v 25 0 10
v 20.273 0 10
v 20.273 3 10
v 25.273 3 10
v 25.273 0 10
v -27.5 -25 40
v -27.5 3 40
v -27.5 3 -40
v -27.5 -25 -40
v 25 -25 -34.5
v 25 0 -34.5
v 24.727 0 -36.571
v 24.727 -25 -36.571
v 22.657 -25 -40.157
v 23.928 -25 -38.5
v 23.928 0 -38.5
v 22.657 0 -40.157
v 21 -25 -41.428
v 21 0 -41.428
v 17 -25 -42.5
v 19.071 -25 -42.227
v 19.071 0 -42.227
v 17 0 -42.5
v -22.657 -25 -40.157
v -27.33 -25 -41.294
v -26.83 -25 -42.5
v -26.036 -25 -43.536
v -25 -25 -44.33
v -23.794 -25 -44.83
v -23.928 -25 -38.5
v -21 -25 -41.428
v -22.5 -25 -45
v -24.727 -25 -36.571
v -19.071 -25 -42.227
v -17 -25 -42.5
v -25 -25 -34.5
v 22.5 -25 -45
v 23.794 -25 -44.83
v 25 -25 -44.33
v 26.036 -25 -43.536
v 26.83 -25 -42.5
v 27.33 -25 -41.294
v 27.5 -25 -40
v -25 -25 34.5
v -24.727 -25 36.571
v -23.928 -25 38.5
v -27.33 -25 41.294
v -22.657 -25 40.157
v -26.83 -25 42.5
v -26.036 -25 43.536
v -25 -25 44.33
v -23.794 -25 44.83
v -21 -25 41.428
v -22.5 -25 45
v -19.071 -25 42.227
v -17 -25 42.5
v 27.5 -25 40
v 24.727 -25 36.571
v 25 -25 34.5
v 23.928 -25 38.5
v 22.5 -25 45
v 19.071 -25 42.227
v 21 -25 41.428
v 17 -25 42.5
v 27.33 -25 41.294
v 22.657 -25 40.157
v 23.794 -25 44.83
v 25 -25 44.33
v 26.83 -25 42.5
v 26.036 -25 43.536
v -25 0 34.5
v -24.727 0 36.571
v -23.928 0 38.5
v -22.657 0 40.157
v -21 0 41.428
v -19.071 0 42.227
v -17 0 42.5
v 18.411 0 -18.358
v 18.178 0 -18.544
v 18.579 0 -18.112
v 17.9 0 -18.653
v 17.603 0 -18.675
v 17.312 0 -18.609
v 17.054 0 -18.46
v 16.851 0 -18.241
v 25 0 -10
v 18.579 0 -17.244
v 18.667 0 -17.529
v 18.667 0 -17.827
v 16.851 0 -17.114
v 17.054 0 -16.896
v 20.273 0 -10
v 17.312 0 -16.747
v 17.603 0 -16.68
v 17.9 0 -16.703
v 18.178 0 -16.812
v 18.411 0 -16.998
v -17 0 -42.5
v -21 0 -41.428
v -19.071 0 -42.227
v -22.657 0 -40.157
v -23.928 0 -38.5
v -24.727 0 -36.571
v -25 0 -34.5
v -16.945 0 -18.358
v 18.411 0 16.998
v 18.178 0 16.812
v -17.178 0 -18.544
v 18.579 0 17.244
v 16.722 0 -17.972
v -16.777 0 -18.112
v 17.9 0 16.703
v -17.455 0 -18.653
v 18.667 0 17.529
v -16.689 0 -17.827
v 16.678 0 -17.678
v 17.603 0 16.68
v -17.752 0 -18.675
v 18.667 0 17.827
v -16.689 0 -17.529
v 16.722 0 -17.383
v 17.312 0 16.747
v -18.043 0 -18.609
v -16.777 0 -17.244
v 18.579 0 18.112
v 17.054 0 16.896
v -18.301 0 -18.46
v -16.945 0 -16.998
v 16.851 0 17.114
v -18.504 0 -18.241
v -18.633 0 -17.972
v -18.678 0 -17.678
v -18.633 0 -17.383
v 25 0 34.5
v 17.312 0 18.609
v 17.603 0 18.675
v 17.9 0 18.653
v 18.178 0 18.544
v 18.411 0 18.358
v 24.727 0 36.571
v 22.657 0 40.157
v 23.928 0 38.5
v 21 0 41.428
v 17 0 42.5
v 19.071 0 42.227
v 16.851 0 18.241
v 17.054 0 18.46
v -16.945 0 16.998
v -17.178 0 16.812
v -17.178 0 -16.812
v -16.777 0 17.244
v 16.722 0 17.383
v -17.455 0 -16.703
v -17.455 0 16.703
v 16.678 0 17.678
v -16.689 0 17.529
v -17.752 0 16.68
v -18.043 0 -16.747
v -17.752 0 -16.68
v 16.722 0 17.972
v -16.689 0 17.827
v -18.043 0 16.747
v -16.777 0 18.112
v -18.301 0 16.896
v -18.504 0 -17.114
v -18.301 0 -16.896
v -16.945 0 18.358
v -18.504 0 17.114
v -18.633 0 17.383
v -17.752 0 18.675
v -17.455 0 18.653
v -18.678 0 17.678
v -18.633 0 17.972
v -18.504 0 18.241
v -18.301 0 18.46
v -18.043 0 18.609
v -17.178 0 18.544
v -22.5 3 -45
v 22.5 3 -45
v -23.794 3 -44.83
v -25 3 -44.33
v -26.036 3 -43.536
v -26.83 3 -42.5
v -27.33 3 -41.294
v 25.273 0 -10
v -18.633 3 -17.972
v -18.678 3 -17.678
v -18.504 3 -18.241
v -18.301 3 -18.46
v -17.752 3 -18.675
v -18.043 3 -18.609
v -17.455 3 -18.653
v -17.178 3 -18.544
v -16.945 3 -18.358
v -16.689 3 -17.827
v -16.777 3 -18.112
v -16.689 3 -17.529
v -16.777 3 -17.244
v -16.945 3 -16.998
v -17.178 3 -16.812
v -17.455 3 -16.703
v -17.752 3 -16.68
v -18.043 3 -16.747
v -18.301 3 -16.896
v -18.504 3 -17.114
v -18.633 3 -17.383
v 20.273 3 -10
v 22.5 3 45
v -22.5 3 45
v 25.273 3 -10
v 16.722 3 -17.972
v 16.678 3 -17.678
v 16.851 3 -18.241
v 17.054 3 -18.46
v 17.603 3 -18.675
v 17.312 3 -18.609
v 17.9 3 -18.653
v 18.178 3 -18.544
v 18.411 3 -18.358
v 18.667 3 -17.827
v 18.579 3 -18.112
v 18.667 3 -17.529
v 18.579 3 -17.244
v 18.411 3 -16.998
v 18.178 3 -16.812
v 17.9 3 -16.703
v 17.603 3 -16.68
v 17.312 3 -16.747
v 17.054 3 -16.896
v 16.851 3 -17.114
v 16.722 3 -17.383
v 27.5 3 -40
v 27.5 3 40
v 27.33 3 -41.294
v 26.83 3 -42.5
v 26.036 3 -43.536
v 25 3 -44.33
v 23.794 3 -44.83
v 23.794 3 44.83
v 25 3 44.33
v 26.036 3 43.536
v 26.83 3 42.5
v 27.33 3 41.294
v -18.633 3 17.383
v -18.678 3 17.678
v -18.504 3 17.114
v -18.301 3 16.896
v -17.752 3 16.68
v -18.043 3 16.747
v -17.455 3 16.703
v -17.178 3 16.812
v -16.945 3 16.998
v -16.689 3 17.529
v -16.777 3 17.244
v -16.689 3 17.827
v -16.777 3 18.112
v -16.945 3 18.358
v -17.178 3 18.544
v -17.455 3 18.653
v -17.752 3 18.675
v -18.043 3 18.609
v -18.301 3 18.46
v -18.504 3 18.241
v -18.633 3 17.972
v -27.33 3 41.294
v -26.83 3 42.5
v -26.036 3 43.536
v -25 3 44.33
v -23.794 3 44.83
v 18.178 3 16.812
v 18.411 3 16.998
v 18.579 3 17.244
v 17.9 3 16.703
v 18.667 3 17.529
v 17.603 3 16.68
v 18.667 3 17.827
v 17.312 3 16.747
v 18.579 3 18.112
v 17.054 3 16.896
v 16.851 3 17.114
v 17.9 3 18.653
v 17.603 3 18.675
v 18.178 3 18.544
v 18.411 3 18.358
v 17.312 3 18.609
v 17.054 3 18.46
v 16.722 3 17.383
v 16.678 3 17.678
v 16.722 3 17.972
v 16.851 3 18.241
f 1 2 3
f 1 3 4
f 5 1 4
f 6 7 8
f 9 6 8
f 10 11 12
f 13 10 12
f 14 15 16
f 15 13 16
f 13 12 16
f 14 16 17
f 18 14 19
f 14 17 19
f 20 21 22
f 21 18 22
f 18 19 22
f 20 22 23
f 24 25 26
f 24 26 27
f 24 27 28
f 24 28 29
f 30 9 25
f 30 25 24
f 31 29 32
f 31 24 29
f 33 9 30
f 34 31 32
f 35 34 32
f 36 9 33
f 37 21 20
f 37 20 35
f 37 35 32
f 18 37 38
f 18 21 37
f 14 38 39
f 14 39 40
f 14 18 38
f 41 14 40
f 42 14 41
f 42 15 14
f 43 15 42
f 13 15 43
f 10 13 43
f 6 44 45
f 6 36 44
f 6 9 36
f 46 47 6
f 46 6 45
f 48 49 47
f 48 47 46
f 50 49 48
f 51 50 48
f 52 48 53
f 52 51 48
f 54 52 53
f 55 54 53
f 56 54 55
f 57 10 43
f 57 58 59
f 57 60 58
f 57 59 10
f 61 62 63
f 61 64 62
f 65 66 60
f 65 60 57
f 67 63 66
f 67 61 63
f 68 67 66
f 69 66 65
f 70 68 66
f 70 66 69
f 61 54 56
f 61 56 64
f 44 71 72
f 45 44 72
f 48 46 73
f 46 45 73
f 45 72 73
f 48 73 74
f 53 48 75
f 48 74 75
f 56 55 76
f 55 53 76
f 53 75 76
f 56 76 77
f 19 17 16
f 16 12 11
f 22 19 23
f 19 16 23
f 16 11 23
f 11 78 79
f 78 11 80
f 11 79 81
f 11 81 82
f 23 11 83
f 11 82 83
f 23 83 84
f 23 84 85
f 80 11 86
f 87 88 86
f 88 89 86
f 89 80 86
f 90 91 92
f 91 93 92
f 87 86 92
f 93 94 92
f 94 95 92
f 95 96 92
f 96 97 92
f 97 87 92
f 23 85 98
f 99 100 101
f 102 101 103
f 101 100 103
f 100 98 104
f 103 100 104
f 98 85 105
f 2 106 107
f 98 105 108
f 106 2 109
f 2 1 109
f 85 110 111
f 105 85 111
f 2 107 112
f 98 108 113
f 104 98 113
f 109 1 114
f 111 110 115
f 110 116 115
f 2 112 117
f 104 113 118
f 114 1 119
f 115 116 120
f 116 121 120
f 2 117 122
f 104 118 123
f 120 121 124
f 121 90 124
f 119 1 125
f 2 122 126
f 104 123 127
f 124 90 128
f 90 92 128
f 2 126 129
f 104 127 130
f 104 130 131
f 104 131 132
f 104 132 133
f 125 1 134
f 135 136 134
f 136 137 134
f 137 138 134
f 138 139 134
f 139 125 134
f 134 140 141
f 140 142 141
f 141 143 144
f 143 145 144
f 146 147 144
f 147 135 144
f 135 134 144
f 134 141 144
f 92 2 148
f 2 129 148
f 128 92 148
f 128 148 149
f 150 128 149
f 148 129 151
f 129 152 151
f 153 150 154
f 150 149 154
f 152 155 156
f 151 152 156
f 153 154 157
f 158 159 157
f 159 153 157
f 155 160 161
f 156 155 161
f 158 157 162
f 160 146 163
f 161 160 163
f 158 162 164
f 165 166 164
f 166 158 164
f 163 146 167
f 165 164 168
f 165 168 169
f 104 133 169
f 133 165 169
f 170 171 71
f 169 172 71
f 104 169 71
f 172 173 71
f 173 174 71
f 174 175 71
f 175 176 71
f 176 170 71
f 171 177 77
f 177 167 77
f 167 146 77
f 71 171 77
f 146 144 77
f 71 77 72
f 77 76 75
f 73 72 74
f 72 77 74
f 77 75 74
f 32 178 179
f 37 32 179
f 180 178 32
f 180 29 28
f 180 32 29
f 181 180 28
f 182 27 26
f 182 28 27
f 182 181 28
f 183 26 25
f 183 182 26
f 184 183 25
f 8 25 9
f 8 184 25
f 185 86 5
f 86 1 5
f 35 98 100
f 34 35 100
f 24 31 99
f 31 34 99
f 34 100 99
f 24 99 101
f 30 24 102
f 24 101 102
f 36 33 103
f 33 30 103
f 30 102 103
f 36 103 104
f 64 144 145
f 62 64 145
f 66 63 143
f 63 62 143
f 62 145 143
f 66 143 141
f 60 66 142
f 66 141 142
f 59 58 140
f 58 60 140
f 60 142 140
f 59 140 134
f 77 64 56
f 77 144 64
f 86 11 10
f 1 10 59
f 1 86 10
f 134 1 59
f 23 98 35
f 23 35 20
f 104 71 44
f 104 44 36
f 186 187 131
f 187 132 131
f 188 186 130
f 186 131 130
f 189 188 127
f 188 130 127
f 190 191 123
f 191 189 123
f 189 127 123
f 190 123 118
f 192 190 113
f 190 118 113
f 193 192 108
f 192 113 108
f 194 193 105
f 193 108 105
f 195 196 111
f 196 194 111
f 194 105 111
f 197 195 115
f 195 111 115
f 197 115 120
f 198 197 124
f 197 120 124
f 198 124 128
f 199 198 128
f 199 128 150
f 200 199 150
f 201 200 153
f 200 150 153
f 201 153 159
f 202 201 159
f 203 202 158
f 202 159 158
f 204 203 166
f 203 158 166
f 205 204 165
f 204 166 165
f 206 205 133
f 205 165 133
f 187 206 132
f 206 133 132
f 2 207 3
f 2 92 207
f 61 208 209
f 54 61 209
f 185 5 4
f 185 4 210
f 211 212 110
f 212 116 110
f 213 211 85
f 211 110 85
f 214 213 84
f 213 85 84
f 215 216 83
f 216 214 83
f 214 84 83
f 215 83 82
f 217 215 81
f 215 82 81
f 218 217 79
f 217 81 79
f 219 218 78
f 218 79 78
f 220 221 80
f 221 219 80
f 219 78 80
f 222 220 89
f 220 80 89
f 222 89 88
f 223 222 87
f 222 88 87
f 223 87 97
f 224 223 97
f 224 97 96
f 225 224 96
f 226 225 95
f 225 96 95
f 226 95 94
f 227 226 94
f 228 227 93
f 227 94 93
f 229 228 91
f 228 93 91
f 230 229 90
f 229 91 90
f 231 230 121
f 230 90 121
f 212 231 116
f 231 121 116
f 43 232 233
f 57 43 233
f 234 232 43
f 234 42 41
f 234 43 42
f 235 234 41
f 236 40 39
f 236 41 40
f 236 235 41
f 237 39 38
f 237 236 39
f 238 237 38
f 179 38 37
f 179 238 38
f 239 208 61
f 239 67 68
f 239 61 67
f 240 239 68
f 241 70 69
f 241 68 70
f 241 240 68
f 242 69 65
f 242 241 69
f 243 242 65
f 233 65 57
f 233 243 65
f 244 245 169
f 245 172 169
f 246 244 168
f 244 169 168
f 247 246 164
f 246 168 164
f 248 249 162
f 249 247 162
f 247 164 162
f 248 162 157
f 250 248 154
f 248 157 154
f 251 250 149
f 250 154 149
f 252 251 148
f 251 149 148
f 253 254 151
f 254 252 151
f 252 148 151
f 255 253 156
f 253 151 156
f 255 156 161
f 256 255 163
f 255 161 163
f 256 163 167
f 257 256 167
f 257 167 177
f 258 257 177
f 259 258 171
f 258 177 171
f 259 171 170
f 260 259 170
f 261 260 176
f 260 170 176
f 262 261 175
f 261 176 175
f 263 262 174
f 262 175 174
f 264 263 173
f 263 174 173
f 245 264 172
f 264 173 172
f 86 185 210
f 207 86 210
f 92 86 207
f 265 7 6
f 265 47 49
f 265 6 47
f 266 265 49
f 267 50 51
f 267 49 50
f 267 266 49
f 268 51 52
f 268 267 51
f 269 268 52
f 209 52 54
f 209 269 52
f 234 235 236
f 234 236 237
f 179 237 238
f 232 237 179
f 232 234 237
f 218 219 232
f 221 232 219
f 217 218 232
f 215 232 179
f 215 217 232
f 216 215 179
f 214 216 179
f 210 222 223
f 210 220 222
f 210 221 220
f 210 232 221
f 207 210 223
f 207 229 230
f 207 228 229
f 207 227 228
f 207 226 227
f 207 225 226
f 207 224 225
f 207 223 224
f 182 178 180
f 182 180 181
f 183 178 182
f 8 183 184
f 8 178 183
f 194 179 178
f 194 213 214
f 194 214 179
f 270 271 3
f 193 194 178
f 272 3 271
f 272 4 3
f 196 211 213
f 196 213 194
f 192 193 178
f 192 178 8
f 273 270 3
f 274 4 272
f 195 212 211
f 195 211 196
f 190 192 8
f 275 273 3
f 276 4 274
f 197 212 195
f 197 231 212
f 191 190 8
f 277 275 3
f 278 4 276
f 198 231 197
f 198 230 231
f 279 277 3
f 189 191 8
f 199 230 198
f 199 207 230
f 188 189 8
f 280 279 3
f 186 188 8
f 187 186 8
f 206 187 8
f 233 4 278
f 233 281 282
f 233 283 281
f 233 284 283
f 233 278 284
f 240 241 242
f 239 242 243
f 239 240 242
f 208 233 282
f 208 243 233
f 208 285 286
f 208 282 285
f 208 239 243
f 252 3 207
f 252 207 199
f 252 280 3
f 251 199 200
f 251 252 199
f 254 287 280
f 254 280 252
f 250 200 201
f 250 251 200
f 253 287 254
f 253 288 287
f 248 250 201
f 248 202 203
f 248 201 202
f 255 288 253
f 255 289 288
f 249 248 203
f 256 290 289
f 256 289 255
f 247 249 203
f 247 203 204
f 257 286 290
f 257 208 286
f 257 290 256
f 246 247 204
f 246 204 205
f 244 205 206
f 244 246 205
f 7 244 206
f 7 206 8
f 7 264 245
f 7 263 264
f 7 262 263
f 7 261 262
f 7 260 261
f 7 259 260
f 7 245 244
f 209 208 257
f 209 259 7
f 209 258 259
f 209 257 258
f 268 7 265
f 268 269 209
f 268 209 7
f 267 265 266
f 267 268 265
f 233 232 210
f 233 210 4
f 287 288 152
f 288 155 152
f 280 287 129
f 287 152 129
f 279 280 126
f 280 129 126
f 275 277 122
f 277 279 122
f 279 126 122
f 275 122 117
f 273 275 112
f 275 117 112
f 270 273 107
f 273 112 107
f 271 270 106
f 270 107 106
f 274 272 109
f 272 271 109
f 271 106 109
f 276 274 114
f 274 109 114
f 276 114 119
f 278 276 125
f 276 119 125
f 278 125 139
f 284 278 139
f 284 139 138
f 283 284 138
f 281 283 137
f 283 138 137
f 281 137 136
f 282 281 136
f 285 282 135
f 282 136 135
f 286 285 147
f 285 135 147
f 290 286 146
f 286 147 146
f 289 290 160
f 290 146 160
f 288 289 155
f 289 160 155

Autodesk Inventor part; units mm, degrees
ref_plane "YZ Plane" through (0, 0, 0) normal (1, 0, 0) x (0, 1, 0)
ref_plane "XZ Plane" through (0, 0, 0) normal (0, 1, 0) x (-1, 0, 0)
ref_plane "XY Plane" through (0, 0, 0) normal (0, 0, 1) x (1, 0, 0)
sketch "Sketch1" plane through (0, 0, 0) normal (0, 1, 0) x (-1, 0, 0)
  line L0 (22.5, 45) -> (-22.5, 45)
  line L1 (-27.5, 40) -> (-27.5, -40)
  line L2 (-22.5, -45) -> (22.5, -45)
  line L3 (27.5, -40) -> (27.5, 40)
  line L4 (27.5, 45) -> (-27.5, -45) construction
  line L5 (-27.5, 45) -> (27.5, -45) construction
  line L6 (0, 0) -> (17.6777, 17.6777) construction
  line L7 (0, 0) -> (25, 0) construction
  circle A0 centre (17.6777, 17.6777) radius 1
  line L8 (17.6777, 17.6777) -> (21.2132, 14.1421) construction
  arc A1 (21.2132, 14.1421) -> (14.1421, 21.2132) centre (17.6777, 17.6777) ccw construction
  circle A2 centre (0, 0) radius 20 construction
  line L9 (14.1421, 21.2132) -> (10.1575, 17.2286) construction
  arc A3 (-6.25, 18.9984) -> (6.25, 18.9984) centre (0, 0) ccw construction
  line L10 (21.2132, 14.1421) -> (17.2286, 10.1575) construction
  line L11 (-14.1421, 21.2132) -> (-10.1575, 17.2286) construction
  arc A4 (-14.1421, 21.2132) -> (-21.2132, 14.1421) centre (-17.6777, 17.6777) ccw construction
  line L12 (-21.2132, 14.1421) -> (-17.2286, 10.1575) construction
  circle A5 centre (-17.6777, 17.6777) radius 1
  line L13 (-21.2132, -14.1421) -> (-17.2286, -10.1575) construction
  arc A6 (-21.2132, -14.1421) -> (-14.1421, -21.2132) centre (-17.6777, -17.6777) ccw construction
  line L14 (-14.1421, -21.2132) -> (-10.1575, -17.2286) construction
  circle A7 centre (-17.6777, -17.6777) radius 1
  line L15 (14.1421, -21.2132) -> (10.1575, -17.2286) construction
  arc A8 (14.1421, -21.2132) -> (21.2132, -14.1421) centre (17.6777, -17.6777) ccw construction
  line L16 (21.2132, -14.1421) -> (17.2286, -10.1575) construction
  circle A9 centre (17.6777, -17.6777) radius 1
  line L17 (-20.273, 10) -> (-25.273, 10)
  line L18 (-25.273, 10) -> (-25.273, -10)
  line L19 (-25.273, -10) -> (-20.273, -10)
  line L20 (-20.273, -10) -> (-20.273, 10)
  line L21 (-20.273, 10) -> (-25.273, -10) construction
  line L22 (-25.273, 10) -> (-20.273, -10) construction
  line L23 (39.9497, 0) -> (-39.9497, 0) projected
  arc A10 (22.5, -45) -> (27.5, -40) centre (22.5, -40) ccw
  arc A11 (27.5, 40) -> (22.5, 45) centre (22.5, 40) ccw
  arc A12 (-22.5, 45) -> (-27.5, 40) centre (-22.5, 40) ccw
  arc A13 (-27.5, -40) -> (-22.5, -45) centre (-22.5, -40) ccw
  point P0 (-22.773, 0)
  point P1 (-22.773, 0)
  dimension "d0" = 55
  dimension "d1" = 90
  dimension "d4" = 25
  dimension "d5" = 45
  dimension "d6" = 2
  dimension "d7" = 5
  dimension "d8" = 360
  dimension "d9" = 5
  dimension "d10" = 20
  dimension "d18" = 5
extrude "Extrusion1" add sketch "Sketch1" along normal blind 3 contours A11 L3 L23 L20 L17 L18 L1 A12 L0 | L3 A10 L2 A13 L1 L23 L18 L19 L20
sketch "Sketch2" plane through (0, 0, 0) normal (0, -1, 0) x (1, 0, 0)
  line L0 (22.5, 45) -> (-22.5, 45)
  line L1 (-27.5, 40) -> (-27.5, -40)
  line L2 (-22.5, -45) -> (22.5, -45)
  line L3 (27.5, -40) -> (27.5, 40)
  line L4 (27.5, 45) -> (-27.5, -45) construction
  line L5 (-27.5, 45) -> (27.5, -45) construction
  line L6 (17, 42.5) -> (-17, 42.5)
  line L7 (-25, 34.5) -> (-25, -34.5)
  line L8 (-17, -42.5) -> (17, -42.5)
  line L9 (25, -34.5) -> (25, 34.5)
  line L10 (25, 42.5) -> (-25, -42.5) construction
  line L11 (-25, 42.5) -> (25, -42.5) construction
  arc A0 (25, 34.5) -> (17, 42.5) centre (17, 34.5) ccw
  arc A1 (17, -42.5) -> (25, -34.5) centre (17, -34.5) ccw
  arc A2 (-25, -34.5) -> (-17, -42.5) centre (-17, -34.5) ccw
  arc A3 (-17, 42.5) -> (-25, 34.5) centre (-17, 34.5) ccw
  arc A4 (27.5, 40) -> (22.5, 45) centre (22.5, 40) ccw
  arc A5 (-22.5, 45) -> (-27.5, 40) centre (-22.5, 40) ccw
  arc A6 (-27.5, -40) -> (-22.5, -45) centre (-22.5, -40) ccw
  arc A7 (22.5, -45) -> (27.5, -40) centre (22.5, -40) ccw
  point P0 (0, 0)
  dimension "d13" = 55
  dimension "d14" = 90
  dimension "d15" = 50
  dimension "d16" = 85
  dimension "d17" = 8
  dimension "d21" = 5
extrude "Extrusion2" add sketch "Sketch2" along normal blind 25
properties part number "mount1"
